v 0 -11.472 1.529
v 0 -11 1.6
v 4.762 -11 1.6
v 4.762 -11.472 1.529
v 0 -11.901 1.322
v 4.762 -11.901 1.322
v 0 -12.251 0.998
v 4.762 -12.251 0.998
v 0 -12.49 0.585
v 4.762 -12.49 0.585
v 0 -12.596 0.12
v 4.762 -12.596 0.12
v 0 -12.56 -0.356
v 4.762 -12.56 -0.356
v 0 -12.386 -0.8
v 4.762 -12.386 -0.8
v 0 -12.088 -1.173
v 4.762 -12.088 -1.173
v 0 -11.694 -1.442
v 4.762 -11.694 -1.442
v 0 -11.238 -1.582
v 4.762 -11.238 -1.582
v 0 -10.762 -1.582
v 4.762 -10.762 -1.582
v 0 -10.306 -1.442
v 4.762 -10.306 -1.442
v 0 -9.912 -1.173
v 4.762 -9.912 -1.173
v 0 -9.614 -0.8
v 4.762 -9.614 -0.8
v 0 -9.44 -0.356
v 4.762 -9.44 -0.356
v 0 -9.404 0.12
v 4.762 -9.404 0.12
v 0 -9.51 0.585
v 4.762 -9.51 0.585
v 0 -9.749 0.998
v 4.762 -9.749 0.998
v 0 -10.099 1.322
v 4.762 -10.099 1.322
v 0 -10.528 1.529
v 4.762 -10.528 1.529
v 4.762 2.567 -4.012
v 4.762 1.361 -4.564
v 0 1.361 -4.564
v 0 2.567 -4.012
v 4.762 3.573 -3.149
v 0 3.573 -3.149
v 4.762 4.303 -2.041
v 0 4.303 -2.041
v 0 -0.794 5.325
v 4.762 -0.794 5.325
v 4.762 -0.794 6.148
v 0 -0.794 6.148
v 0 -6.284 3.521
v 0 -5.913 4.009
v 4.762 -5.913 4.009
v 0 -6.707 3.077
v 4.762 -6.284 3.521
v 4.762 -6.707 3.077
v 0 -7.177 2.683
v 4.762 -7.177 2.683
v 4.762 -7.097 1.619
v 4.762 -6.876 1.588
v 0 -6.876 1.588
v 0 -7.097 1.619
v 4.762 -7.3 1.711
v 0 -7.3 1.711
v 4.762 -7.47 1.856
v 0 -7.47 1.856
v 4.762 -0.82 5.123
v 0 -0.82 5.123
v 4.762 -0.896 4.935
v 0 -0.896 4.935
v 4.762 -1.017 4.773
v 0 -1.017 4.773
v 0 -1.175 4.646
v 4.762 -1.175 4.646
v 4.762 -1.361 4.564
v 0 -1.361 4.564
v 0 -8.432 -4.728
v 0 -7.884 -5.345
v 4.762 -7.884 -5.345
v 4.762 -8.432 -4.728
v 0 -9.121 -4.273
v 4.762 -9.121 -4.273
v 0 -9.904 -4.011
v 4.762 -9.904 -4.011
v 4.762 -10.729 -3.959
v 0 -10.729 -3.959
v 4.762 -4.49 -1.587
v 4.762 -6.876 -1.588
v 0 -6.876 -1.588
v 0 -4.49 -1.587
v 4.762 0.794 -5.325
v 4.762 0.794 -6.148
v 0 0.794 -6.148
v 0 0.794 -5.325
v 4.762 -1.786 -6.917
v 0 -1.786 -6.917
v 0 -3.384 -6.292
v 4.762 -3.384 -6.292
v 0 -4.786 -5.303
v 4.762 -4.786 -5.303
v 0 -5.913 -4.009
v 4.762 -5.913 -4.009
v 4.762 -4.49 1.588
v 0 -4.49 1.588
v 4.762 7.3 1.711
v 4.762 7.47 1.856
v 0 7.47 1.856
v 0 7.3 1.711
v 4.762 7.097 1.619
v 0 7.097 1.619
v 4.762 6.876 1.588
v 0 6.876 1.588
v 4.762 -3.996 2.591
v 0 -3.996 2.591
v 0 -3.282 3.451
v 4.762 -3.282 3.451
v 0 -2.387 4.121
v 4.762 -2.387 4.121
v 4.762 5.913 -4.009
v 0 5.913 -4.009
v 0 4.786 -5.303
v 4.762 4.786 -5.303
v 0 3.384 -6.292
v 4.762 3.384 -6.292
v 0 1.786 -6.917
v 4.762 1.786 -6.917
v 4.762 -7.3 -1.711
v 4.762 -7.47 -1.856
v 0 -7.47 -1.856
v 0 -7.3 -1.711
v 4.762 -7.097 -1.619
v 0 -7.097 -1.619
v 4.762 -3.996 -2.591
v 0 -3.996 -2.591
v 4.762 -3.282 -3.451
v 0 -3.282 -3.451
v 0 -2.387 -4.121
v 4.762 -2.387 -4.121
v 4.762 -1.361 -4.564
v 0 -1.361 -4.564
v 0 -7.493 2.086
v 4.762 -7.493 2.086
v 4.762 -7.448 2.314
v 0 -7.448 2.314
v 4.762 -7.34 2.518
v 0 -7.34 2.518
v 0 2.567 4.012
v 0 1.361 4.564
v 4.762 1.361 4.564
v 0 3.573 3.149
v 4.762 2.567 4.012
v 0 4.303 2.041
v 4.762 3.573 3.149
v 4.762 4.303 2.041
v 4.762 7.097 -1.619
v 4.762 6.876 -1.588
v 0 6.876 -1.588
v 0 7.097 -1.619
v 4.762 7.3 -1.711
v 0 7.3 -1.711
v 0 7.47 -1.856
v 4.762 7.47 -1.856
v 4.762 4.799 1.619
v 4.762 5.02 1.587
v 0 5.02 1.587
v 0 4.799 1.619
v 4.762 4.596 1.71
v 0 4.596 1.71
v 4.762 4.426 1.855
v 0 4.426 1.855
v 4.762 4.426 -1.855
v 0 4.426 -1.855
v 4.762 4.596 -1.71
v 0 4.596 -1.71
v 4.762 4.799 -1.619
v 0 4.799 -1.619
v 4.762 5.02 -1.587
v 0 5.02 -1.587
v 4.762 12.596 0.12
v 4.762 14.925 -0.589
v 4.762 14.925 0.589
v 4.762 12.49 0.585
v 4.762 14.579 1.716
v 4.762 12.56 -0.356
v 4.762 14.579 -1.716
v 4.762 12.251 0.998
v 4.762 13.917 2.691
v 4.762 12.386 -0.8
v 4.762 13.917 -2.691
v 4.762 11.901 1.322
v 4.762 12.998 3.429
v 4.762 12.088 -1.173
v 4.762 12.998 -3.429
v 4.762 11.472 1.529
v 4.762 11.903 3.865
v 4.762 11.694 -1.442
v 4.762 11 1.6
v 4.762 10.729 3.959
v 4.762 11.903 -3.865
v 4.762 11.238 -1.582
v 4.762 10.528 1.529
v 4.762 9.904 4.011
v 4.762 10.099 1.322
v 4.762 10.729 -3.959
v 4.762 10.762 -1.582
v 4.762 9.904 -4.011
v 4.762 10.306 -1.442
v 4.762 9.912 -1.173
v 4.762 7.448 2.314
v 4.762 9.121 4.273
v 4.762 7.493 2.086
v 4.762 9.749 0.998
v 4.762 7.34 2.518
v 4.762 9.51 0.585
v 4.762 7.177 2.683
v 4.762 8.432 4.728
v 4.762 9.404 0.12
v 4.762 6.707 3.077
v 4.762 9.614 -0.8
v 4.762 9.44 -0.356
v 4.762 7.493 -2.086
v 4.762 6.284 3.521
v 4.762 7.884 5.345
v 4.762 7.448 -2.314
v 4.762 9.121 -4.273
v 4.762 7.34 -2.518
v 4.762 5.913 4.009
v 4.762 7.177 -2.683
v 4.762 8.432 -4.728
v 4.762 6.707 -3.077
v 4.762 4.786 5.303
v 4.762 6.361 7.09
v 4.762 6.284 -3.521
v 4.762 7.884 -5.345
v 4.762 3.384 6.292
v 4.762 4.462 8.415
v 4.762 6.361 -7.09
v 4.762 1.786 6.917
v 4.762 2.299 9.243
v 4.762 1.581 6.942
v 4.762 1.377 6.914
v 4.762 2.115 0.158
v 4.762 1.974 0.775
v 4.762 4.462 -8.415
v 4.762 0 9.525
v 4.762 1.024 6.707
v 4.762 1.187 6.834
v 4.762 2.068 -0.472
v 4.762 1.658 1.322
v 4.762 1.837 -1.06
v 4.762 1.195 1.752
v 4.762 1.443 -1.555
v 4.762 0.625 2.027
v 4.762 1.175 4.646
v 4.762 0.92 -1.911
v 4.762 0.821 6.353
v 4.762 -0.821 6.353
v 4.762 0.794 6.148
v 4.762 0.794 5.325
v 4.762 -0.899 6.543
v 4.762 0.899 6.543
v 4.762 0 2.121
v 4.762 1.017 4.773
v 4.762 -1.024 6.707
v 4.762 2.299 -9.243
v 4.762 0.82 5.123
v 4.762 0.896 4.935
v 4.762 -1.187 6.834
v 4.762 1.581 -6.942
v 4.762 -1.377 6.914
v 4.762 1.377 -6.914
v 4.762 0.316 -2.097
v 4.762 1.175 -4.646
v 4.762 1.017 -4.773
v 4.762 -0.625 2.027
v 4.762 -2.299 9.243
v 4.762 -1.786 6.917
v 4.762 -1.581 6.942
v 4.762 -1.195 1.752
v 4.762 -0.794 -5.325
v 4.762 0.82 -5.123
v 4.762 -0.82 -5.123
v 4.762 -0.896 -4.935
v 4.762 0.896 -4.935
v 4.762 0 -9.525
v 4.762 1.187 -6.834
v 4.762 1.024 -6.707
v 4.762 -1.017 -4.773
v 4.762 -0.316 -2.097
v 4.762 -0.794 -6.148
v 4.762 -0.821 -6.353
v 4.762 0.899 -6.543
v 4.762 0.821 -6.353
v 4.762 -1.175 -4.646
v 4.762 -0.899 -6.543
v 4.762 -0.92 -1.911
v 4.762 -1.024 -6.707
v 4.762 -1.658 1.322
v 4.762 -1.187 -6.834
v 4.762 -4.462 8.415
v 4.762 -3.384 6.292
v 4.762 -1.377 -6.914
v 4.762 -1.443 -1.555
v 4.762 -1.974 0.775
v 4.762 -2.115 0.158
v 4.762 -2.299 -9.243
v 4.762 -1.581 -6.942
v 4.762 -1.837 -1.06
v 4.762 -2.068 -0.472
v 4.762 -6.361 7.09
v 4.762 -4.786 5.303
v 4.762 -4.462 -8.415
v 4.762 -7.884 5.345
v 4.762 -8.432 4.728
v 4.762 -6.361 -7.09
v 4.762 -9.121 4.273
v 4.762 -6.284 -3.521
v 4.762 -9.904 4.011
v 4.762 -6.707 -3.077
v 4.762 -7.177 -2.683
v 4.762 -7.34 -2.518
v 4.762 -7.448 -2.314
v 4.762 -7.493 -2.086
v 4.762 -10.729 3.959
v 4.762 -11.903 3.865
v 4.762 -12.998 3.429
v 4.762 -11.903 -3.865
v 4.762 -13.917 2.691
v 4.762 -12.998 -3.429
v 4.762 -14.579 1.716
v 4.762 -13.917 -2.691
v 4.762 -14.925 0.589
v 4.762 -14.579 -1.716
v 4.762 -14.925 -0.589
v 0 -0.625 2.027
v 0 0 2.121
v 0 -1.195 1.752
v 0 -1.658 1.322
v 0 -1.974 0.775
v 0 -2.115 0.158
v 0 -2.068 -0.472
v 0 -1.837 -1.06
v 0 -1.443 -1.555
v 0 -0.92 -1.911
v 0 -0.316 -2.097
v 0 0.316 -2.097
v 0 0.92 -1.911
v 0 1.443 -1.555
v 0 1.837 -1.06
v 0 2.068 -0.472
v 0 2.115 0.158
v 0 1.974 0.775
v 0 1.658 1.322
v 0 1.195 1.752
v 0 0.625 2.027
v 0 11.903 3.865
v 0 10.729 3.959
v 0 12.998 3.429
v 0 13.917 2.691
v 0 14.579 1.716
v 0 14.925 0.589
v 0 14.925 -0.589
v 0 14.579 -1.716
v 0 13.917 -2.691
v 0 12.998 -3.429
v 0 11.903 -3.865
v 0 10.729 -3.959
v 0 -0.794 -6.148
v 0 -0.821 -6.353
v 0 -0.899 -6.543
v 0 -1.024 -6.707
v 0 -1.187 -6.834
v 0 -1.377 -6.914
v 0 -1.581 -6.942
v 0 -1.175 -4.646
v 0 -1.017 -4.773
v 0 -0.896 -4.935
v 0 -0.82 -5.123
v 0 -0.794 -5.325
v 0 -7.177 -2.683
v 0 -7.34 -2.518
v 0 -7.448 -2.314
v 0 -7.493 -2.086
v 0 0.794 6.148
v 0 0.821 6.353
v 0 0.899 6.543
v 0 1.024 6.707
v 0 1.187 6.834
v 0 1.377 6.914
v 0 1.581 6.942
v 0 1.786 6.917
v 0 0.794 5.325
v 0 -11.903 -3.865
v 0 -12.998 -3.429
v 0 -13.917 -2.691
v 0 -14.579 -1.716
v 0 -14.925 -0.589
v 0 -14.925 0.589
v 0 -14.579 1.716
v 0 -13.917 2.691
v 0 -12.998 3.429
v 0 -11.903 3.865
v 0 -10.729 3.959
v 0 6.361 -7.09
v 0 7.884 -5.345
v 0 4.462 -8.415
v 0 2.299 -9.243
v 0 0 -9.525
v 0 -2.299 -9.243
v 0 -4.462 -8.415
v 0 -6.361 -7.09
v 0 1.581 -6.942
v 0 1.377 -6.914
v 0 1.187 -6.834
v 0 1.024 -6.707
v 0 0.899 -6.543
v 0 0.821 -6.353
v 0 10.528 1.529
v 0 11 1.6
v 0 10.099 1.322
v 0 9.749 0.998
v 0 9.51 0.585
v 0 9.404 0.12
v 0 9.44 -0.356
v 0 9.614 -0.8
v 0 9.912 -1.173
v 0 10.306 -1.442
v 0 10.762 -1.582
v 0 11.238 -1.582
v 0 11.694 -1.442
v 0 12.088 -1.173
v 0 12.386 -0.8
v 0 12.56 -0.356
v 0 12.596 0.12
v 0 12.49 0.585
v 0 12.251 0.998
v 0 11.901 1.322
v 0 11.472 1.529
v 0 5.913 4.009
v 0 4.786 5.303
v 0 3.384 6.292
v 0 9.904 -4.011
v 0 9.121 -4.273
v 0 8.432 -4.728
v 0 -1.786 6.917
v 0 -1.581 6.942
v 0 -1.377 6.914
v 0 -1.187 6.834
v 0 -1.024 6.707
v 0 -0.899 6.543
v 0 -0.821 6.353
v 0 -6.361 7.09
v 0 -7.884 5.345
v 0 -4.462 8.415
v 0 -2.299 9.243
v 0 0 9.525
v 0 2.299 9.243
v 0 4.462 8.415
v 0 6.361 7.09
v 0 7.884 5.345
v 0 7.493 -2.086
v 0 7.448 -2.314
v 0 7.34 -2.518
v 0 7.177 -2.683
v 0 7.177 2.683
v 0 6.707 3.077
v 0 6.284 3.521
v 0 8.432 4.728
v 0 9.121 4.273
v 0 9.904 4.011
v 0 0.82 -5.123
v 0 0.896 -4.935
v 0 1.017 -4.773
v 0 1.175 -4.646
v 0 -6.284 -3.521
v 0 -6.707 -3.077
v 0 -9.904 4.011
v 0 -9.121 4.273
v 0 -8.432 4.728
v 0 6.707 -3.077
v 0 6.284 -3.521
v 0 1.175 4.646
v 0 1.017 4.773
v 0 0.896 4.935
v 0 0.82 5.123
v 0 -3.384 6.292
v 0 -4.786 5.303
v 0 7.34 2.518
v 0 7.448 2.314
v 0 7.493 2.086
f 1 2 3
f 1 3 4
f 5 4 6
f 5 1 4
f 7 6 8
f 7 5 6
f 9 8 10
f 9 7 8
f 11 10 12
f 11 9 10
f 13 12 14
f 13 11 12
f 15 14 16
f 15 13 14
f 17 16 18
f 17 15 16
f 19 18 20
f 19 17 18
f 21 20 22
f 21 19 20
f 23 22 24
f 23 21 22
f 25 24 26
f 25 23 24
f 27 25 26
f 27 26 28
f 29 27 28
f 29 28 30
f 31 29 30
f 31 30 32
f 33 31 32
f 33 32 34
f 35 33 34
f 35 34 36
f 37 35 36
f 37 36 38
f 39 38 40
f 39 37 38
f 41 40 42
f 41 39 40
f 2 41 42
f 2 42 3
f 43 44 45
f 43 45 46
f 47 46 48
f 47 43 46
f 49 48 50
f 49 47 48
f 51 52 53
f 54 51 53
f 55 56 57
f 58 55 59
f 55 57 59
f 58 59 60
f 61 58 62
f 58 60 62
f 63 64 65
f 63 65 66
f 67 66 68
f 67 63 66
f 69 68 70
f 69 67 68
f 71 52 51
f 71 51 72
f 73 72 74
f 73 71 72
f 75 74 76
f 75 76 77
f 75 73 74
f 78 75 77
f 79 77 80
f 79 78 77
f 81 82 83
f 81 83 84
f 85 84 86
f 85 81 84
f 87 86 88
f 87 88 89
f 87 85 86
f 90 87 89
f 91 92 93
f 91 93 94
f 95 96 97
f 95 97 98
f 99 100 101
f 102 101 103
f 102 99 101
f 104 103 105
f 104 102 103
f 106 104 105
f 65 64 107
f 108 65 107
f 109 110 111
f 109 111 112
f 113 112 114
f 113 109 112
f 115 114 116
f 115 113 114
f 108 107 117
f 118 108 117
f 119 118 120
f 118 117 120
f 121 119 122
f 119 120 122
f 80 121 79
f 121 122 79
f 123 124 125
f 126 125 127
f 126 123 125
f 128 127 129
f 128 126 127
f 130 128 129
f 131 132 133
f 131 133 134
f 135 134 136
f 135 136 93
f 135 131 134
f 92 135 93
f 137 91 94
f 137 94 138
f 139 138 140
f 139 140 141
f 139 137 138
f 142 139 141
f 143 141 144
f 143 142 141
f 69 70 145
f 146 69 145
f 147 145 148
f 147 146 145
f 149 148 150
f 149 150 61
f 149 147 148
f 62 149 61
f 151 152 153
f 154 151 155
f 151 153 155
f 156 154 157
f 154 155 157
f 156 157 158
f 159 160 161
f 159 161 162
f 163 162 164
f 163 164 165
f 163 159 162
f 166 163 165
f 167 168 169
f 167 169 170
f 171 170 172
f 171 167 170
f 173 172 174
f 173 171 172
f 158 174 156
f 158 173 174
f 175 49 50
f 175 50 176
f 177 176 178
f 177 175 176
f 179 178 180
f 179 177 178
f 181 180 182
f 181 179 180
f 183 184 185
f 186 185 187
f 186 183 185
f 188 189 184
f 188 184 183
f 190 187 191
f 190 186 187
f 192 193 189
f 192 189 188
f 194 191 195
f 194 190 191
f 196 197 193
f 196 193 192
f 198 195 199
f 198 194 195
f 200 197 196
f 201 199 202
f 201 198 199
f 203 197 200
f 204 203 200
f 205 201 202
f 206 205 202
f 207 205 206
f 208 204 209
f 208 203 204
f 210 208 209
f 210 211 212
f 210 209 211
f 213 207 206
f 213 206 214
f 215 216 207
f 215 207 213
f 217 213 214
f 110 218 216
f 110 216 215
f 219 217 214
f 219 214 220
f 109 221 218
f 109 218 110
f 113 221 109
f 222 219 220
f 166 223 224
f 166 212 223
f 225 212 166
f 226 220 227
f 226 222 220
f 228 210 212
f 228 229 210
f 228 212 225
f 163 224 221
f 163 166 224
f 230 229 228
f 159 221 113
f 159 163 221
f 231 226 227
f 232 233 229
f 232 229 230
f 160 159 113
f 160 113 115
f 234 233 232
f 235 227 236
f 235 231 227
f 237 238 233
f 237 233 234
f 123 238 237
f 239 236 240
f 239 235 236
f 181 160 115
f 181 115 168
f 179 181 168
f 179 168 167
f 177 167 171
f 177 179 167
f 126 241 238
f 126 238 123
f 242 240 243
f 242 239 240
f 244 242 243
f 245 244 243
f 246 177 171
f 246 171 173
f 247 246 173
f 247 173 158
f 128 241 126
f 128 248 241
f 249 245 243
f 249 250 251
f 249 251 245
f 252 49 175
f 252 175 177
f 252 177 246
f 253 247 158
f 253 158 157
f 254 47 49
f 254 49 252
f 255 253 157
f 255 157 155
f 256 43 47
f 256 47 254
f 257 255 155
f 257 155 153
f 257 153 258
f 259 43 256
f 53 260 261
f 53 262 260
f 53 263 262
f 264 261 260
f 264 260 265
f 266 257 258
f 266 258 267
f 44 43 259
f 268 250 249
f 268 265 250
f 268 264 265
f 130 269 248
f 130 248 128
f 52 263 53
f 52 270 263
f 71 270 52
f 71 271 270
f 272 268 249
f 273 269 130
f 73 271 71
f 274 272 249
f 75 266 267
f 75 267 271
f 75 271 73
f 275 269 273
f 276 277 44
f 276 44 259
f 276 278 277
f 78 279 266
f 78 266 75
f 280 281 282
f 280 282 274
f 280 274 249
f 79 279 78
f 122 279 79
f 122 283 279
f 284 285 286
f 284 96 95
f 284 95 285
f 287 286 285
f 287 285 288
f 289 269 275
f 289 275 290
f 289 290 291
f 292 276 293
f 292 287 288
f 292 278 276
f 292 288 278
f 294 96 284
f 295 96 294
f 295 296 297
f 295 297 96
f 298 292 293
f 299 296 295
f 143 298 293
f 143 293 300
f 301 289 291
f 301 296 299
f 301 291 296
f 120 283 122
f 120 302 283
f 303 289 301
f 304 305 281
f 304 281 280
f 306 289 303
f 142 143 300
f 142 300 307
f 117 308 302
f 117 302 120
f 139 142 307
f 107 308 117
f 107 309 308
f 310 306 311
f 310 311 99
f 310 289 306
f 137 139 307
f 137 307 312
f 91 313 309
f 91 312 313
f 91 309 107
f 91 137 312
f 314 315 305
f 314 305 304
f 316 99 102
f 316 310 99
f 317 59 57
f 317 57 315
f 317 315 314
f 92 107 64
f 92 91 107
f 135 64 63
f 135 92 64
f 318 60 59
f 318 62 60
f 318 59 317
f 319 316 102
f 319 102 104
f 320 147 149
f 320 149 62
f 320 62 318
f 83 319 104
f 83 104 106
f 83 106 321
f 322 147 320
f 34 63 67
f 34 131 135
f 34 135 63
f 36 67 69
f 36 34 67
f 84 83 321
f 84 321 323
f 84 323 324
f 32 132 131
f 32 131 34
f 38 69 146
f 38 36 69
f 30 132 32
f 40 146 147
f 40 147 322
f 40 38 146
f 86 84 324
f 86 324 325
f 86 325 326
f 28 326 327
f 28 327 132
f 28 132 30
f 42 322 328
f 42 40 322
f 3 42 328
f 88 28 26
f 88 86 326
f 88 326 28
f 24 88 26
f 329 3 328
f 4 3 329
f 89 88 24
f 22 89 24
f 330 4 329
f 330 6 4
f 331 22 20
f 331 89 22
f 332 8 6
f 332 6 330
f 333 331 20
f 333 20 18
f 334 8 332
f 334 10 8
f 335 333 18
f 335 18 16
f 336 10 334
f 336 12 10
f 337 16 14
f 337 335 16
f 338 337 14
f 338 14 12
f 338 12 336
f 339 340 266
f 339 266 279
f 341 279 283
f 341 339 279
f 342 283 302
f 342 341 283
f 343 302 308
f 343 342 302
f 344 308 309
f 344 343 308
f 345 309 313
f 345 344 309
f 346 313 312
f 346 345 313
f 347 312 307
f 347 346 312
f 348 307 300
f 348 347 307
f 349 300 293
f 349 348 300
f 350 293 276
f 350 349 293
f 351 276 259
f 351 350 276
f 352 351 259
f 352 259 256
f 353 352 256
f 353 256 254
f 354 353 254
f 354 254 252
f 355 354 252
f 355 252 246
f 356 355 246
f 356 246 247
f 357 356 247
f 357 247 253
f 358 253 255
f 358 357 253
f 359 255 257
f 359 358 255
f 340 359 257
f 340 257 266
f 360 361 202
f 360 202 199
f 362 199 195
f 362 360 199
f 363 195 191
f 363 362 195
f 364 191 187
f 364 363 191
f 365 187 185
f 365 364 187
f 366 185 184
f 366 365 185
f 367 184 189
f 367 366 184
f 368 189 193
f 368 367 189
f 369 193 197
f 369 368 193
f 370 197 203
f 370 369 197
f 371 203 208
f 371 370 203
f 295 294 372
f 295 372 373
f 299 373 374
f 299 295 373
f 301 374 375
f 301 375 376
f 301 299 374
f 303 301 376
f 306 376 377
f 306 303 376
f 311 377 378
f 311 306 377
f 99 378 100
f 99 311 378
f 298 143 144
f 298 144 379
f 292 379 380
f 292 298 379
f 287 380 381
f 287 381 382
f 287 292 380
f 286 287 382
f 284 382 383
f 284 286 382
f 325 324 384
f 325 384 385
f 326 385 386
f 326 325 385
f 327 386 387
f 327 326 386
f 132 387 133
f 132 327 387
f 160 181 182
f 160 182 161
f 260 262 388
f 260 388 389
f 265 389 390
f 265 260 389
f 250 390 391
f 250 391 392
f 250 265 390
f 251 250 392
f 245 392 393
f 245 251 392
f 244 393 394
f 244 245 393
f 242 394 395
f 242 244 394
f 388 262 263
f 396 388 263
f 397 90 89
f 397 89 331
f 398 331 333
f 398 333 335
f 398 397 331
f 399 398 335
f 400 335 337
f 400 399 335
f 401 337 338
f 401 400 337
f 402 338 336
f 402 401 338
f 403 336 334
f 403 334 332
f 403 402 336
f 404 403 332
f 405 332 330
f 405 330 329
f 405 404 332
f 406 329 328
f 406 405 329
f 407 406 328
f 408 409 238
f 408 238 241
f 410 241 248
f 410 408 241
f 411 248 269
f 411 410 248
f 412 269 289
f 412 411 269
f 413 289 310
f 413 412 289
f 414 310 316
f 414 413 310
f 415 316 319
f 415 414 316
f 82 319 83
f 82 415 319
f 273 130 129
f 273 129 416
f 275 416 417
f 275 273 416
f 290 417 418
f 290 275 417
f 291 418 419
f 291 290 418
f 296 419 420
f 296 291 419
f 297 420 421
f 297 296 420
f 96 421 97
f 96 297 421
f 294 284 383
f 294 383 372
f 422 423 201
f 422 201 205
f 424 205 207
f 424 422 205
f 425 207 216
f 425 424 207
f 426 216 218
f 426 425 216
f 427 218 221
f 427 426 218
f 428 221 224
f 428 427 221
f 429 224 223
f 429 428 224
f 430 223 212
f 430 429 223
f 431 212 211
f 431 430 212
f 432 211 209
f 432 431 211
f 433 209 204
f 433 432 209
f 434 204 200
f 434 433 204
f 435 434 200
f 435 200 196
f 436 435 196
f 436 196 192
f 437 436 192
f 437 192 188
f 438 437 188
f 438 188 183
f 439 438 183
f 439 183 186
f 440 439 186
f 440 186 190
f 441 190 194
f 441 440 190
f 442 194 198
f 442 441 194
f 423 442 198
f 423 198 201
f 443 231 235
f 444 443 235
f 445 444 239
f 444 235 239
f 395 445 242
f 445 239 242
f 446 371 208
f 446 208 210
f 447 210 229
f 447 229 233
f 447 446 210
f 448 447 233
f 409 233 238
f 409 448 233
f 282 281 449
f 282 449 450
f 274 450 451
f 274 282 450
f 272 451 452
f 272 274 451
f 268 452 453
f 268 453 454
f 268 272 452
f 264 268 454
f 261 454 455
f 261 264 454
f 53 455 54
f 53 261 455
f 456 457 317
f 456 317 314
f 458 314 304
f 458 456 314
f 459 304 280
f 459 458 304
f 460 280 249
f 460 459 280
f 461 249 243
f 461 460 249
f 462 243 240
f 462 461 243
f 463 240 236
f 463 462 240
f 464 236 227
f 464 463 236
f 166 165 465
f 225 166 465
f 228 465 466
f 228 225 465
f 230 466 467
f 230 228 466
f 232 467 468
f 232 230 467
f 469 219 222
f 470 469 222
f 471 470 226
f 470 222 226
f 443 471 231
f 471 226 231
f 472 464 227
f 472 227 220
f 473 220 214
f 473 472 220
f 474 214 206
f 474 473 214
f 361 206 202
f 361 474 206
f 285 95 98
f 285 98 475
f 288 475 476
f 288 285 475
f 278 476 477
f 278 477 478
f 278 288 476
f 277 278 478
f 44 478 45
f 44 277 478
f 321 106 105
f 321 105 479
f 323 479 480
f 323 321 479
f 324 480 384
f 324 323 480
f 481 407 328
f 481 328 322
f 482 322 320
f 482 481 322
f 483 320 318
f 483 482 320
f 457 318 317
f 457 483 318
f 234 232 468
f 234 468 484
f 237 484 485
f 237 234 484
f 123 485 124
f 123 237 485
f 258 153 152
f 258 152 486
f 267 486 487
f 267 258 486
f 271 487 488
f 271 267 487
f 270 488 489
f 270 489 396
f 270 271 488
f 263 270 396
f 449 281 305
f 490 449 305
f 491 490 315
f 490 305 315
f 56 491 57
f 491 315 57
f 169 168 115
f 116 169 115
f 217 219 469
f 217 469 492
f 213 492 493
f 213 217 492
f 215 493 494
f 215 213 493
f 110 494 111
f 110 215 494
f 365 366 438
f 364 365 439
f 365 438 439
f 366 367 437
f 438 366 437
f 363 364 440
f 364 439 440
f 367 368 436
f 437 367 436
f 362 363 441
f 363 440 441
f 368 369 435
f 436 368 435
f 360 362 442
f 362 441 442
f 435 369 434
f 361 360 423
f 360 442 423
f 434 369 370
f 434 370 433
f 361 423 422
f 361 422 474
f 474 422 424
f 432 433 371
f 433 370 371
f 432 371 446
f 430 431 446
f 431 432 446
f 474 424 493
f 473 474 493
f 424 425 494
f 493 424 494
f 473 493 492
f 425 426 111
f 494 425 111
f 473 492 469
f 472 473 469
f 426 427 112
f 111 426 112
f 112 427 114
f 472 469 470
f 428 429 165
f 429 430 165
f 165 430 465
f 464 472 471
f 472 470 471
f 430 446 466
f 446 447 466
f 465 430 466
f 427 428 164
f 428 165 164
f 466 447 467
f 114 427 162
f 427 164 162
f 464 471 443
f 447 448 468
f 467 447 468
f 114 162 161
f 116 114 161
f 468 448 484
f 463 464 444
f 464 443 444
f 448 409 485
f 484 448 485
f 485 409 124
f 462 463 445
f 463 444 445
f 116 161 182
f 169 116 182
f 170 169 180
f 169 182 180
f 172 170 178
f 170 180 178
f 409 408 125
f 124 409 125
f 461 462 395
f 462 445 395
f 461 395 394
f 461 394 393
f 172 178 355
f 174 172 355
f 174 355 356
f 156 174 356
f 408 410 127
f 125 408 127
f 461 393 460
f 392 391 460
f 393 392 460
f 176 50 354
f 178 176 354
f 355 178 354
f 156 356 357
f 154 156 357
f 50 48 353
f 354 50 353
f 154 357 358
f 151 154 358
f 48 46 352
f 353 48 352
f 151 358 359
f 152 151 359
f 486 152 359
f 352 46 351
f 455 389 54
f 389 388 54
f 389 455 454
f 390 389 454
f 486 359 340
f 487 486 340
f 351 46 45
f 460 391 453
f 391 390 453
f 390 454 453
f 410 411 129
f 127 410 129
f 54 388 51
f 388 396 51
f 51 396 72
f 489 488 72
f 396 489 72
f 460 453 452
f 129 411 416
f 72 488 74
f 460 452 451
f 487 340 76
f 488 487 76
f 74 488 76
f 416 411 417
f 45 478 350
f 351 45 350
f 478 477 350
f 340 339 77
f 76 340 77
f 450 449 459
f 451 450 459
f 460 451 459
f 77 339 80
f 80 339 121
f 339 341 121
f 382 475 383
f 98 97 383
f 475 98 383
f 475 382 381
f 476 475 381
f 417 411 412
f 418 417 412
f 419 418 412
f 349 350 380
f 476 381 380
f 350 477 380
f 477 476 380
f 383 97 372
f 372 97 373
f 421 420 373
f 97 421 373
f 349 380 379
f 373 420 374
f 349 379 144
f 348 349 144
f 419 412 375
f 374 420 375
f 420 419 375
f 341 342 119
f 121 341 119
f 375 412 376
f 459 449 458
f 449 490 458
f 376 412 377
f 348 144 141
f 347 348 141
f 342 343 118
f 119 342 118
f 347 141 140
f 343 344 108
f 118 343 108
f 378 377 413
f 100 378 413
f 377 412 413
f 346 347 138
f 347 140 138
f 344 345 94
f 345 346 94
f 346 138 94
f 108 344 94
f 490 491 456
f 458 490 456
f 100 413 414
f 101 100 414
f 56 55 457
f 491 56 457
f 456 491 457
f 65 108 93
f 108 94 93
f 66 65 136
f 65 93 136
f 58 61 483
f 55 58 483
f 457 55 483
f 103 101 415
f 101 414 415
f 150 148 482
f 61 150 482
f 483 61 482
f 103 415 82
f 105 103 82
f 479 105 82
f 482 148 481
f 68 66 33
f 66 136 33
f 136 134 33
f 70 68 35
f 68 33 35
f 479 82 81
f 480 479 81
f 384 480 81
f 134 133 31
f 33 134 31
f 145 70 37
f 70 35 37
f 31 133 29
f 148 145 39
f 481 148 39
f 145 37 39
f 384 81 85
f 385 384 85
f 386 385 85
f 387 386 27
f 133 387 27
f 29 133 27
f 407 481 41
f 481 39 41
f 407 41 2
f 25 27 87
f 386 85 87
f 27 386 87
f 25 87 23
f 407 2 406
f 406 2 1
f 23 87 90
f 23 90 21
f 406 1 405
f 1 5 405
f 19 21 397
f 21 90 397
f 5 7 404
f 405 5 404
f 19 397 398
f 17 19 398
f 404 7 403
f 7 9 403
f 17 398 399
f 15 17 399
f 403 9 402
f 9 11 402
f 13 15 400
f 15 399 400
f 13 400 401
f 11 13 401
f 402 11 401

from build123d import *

# Parameters (mm, degrees)
SKETCH1_R           = 2.1209000000000002
SKETCH1_R_2         = 1.6002
BOSS_EXTRUDE1_DEPTH = 4.7625
CUT_EXTRUDE1_DEPTH  = 19.370370377662503
FILLET1_R           = 0.79375


with BuildPart() as part:
    # Sketch1 → Boss-Extrude1 (new body)
    with BuildSketch(Plane(origin=(0, 0, 0), x_dir=(0, 0, -1), z_dir=(1, 0, 0))):
        with BuildLine():
            ThreePointArc((-3.9594667824617957, 10.7287079782197), (2.8e-15, 14.96875), (3.9594667824617935, 10.728707978219694))
            ThreePointArc((3.9594667824617935, 10.728707978219694), (4.272672724168048, 9.121274682724051), (5.345280156323423, 7.883755770596593))
            ThreePointArc((5.345280156323423, 7.883755770596593), (9.525, 1.06e-15), (5.345280156323425, -7.883755770596589))
            ThreePointArc((5.345280156323425, -7.883755770596589), (4.272672724168048, -9.12127468272405), (3.9594667824617975, -10.728707978219694))
            ThreePointArc((3.9594667824617975, -10.728707978219694), (2.8e-15, -14.968749999999996), (-3.9594667824617917, -10.7287079782197))
            ThreePointArc((-3.9594667824617917, -10.7287079782197), (-4.272672724168042, -9.121274682724055), (-5.345280156323421, -7.883755770596593))
            ThreePointArc((-5.345280156323421, -7.883755770596593), (-9.524999999999999, -3.06e-15), (-5.345280156323423, 7.883755770596589))
            ThreePointArc((-5.345280156323423, 7.883755770596589), (-4.272672724168045, 9.121274682724053), (-3.9594667824617957, 10.7287079782197))
        make_face()
        with Locations(Location((0, 0, 0), (0, 0, 180))):
            Circle(SKETCH1_R, mode=Mode.SUBTRACT)
        with Locations(Location((0, 11, 0), (0, 0, 180))):
            Circle(SKETCH1_R_2, mode=Mode.SUBTRACT)
        with Locations(Location((0, -11, 0), (0, 0, 180))):
            Circle(SKETCH1_R_2, mode=Mode.SUBTRACT)
    extrude(amount=BOSS_EXTRUDE1_DEPTH)

    # Sketch2 → Cut-Extrude1 (cut, through all)
    with BuildSketch(Plane(origin=(4.7625, 0, 0), x_dir=(0, 0, -1), z_dir=(1, 0, 0))):
        with BuildLine():
            Line((-1.5875000000000001, -7.362580542128799), (-1.5874999999999997, -4.490128060534577))
            ThreePointArc((-1.5874999999999997, -4.490128060534577), (-3.6450027313013944, -3.0651853677722936), (-4.69588832783532, -0.7937500000000003))
            Line((-4.69588832783532, -0.7937500000000003), (-7.09951582856183, -0.7937500000000006))
            ThreePointArc((-7.09951582856183, -0.7937500000000006), (-6.115616956356625, -3.692207104920213), (-4.008960117242562, -5.912816827947443))
            ThreePointArc((-4.008960117242562, -5.912816827947443), (-3.046958974664247, -6.740089655613493), (-2.2977150650912916, -7.764033059168784))
            ThreePointArc((-2.2977150650912916, -7.764033059168784), (-1.9529503466198308, -7.545009188704331), (-1.5875000000000001, -7.362580542128799))
        make_face()
        with BuildLine():
            Line((1.5875000000000001, -7.362580542128799), (1.5874999999999997, -4.490128060534577))
            ThreePointArc((1.5874999999999997, -4.490128060534577), (3.645002731301394, -3.0651853677722944), (4.695888327835319, -0.7937500000000003))
            Line((4.695888327835319, -0.7937500000000003), (7.099515828561831, -0.7937500000000003))
            ThreePointArc((7.099515828561831, -0.7937500000000003), (6.115616956356629, -3.692207104920211), (4.008960117242569, -5.912816827947442))
            ThreePointArc((4.008960117242569, -5.912816827947442), (3.0469589746642507, -6.74008965561349), (2.2977150650912943, -7.764033059168785))
            ThreePointArc((2.2977150650912943, -7.764033059168785), (1.9529503466198321, -7.545009188704331), (1.5875000000000001, -7.362580542128799))
        make_face()
        with BuildLine():
            Line((-7.09951582856183, 0.7937500000000006), (-4.69588832783532, 0.7937500000000003))
            ThreePointArc((-4.69588832783532, 0.7937500000000003), (-3.6450027313013944, 3.0651853677722936), (-1.5874999999999997, 4.490128060534576))
            Line((-1.5874999999999997, 4.490128060534576), (-1.5875000000000004, 7.362580542128802))
            ThreePointArc((-1.5875000000000004, 7.362580542128802), (-1.9529503466198312, 7.545009188704334), (-2.297715065091291, 7.764033059168786))
            ThreePointArc((-2.297715065091291, 7.764033059168786), (-3.046958974664248, 6.74008965561349), (-4.008960117242567, 5.912816827947441))
            ThreePointArc((-4.008960117242567, 5.912816827947441), (-6.115616956356626, 3.692207104920211), (-7.09951582856183, 0.7937500000000006))
        make_face()
        with BuildLine():
            Line((1.5874999999999997, 4.490128060534576), (1.5875000000000004, 7.362580542128802))
            ThreePointArc((1.5875000000000004, 7.362580542128802), (1.9529503466198308, 7.545009188704333), (2.2977150650912908, 7.764033059168786))
            ThreePointArc((2.2977150650912908, 7.764033059168786), (3.04695897466425, 6.740089655613488), (4.0089601172425695, 5.912816827947439))
            ThreePointArc((4.0089601172425695, 5.912816827947439), (6.115616956356628, 3.6922071049202088), (7.09951582856183, 0.7937500000000001))
            Line((7.09951582856183, 0.7937500000000001), (4.695888327835319, 0.7937500000000003))
            ThreePointArc((4.695888327835319, 0.7937500000000003), (3.645002731301393, 3.0651853677722936), (1.5874999999999997, 4.490128060534576))
        make_face()
    extrude(amount=-CUT_EXTRUDE1_DEPTH, mode=Mode.SUBTRACT)

    # Fillet1
    # the kernel refuses this fillet: 0.79375 mm, written as the material it adds along each edge
    with BuildSketch(Plane(origin=(4.7625, -0.79375, -4.69588832783532), x_dir=(0, -0.9739846340944042, 0.2266140607905643), z_dir=(-1, 0, 0))) as fillet1_piece_1:
        with BuildLine():
            CenterArc((0.6306170426342453, -0.7922663309145631), FILLET1_R, 93.50374068607991, 73.39845040097973)
            Line((-0.14248326067818778, -0.612391420162052), (0, 0))
            ThreePointArc((0, 0), (0.2910540196773445, -0.00890201451262073), (0.5821080393546879, 2e-17))
        make_face()
    extrude(amount=4.7625)
    with BuildSketch(Plane(origin=(4.7625, -0.7937500000000003, -7.099515828561831), x_dir=(0, -1.2e-16, 1), z_dir=(-1, 0, 0))) as fillet1_piece_2:
        with BuildLine():
            CenterArc((0.9511547664575569, -0.79375), FILLET1_R, 90.00000000000001, 104.47751218592987)
            ThreePointArc((0.1826096336945221, -0.9921874999999994), (0.07376813927591291, -0.499321331749944), (0, 0))
            Line((0, 0), (0.9511547664575568, 0))
        make_face()
    extrude(amount=4.7625)
    with BuildSketch(Plane(origin=(4.7625, 0.7937500000000004, -7.099515828561831), x_dir=(0, 0.9834817412823682, 0.18100736052492677), z_dir=(-1, 0, 0))) as fillet1_piece_3:
        with BuildLine():
            CenterArc((0.9528046458700647, -0.7917687535280427), FILLET1_R, 85.95092901125643, 104.47751218592998)
            Line((0.17216601372718518, -0.9354433459447041), (0, 0))
            ThreePointArc((0, 0), (0.5044259889900348, 0.01783121824761195), (1.0088519779800686, 3e-17))
        make_face()
    extrude(amount=4.7625)
    with BuildSketch(Plane(origin=(4.7625, 0.7937500000000004, -4.69588832783532), x_dir=(0, -3.5e-16, -1), z_dir=(-1, 0, 0))) as fillet1_piece_4:
        with BuildLine():
            CenterArc((0.6287485435860521, -0.79375), FILLET1_R, 89.99999999999997, 73.39845040097973)
            ThreePointArc((-0.13191386661700052, -0.5669642857142849), (-0.05728650796072109, -0.2854994645150646), (0, 0))
            Line((0, 0), (0.6287485435860525, 0))
        make_face()
    extrude(amount=4.7625)
    with BuildSketch(Plane(origin=(4.7625, 4.490128060534577, -1.5875), x_dir=(0, -0.3814588594181724, -0.9243858169462505), z_dir=(-1, 0, 0))) as fillet1_piece_5:
        with BuildLine():
            CenterArc((0.531562729123544, -0.792696105792815), FILLET1_R, 92.95285644533071, 64.62306647484768)
            Line((-0.2021685130775424, -0.48991313612964066), (0, 0))
            ThreePointArc((0, 0), (0.24533664421086704, -0.00632336524311312), (0.4906732884217341, -2e-17))
        make_face()
    extrude(amount=4.7625)
    with BuildSketch(Plane(origin=(4.7625, 7.764033059168785, -2.2977150650912908), x_dir=(0, -0.5063837713427546, 0.8623082257062661), z_dir=(-1, 0, 0))) as fillet1_piece_6:
        with BuildLine():
            CenterArc((0.7539344065414385, -0.7907853062648578), FILLET1_R, 94.95360014564893, 78.58484225728135)
            ThreePointArc((-0.03477336431713144, -0.7014594159121466), (-0.00629236326442682, -0.35127968530901016), (0, 0))
            ThreePointArc((0, 0), (0.3426974575188369, -0.01482346867571009), (0.685394915037674, 1e-17))
        make_face()
    extrude(amount=4.7625)
    with BuildSketch(Plane(origin=(4.7625, 7.362580542128802, -1.5875000000000004), x_dir=(0, 0.4507075585568903, -0.892671662292294), z_dir=(-1, 0, 0))) as fillet1_piece_7:
        with BuildLine():
            CenterArc((0.4890515947139495, 0.7925039046242565), FILLET1_R, 206.78908923910086, 60.00000000000017)
            Line((-0.21950653723055963, 0.43475478001972634), (0, 0))
            ThreePointArc((0, 0), (0.22229617941543137, 0.00623047687871969), (0.44459235883086456, 0))
        make_face()
    extrude(amount=4.7625)
    with BuildSketch(Plane(origin=(4.7625, 4.490128060534576, 1.5875), x_dir=(0, 1, -4.2e-16), z_dir=(-1, 0, 0))) as fillet1_piece_8:
        with BuildLine():
            CenterArc((0.5299877249827253, -0.79375), FILLET1_R, 89.99999999999997, 64.62306647484775)
            ThreePointArc((-0.1871716729483179, -0.4535714285714287), (-0.08774060732805387, -0.22919781797903635), (0, 0))
            Line((0, 0), (0.5299877249827256, 0))
        make_face()
    extrude(amount=4.7625)
    with BuildSketch(Plane(origin=(4.7625, 7.362580542128802, 1.5875000000000004), x_dir=(0, 0.4507075585568887, 0.8926716622922948), z_dir=(-1, 0, 0))) as fillet1_piece_9:
        with BuildLine():
            CenterArc((0.4890515947139505, -0.7925039046242564), FILLET1_R, 93.21091076089908, 60.000000000000085)
            Line((-0.21950653723055885, -0.43475478001972667), (0, 0))
            ThreePointArc((0, 0), (0.22229617941543217, -0.0062304768787197), (0.4445923588308641, 3e-17))
        make_face()
    extrude(amount=4.7625)
    with BuildSketch(Plane(origin=(4.7625, 7.764033059168787, 2.2977150650912916), x_dir=(0, -0.8361785115671588, 0.5484573791948931), z_dir=(-1, 0, 0))) as fillet1_piece_10:
        with BuildLine():
            CenterArc((0.7524865660320088, -0.79216315106995), FILLET1_R, 93.62356396435027, 78.58484225726829)
            ThreePointArc((-0.03393532877352373, -0.6845542951589412), (-0.0021623763281384, -0.3430110883660692), (0, 0))
            ThreePointArc((0, 0), (0.3511603974816025, -0.01110794251034867), (0.7023207949632068, 0))
        make_face()
    extrude(amount=4.7625)
    with BuildSketch(Plane(origin=(4.7625, 0.7937500000000004, 4.69588832783532), x_dir=(0, 0.9739846340944044, -0.22661406079056337), z_dir=(-1, 0, 0))) as fillet1_piece_11:
        with BuildLine():
            CenterArc((0.6306170426342449, -0.7922663309145632), FILLET1_R, 93.50374068607998, 73.39845040097971)
            Line((-0.14248326067818828, -0.6123914201620527), (0, 0))
            ThreePointArc((0, 0), (0.29105401967734285, -0.00890201451262188), (0.5821080393546864, -1e-17))
        make_face()
    extrude(amount=4.7625)
    with BuildSketch(Plane(origin=(4.7625, -0.79375, 4.69588832783532), x_dir=(0, -7.1e-16, 1), z_dir=(-1, 0, 0))) as fillet1_piece_12:
        with BuildLine():
            CenterArc((0.6287485435860539, -0.79375), FILLET1_R, 90.00000000000004, 73.39845040097977)
            ThreePointArc((-0.13191386661699994, -0.5669642857142864), (-0.05728650796072168, -0.28549946451506575), (0, 0))
            Line((0, 0), (0.6287485435860534, 0))
        make_face()
    extrude(amount=4.7625)
    with BuildSketch(Plane(origin=(4.7625, 0.7937500000000007, 7.099515828561831), x_dir=(0, -3.5e-16, -1), z_dir=(-1, 0, 0))) as fillet1_piece_13:
        with BuildLine():
            CenterArc((0.9511547664575583, -0.79375), FILLET1_R, 89.99999999999997, 104.47751218592998)
            ThreePointArc((0.1826096336945243, -0.9921875000000004), (0.07376813927591445, -0.4993213317499442), (0, 0))
            Line((0, 0), (0.9511547664575586, 0))
        make_face()
    extrude(amount=4.7625)
    with BuildSketch(Plane(origin=(4.7625, -0.7937500000000006, 7.099515828561831), x_dir=(0, -0.9834817412823684, -0.18100736052492664), z_dir=(-1, 0, 0))) as fillet1_piece_14:
        with BuildLine():
            CenterArc((0.9528046458700652, -0.7917687535280429), FILLET1_R, 85.9509290112564, 104.47751218593004)
            Line((0.17216601372718549, -0.9354433459447042), (0, 0))
            ThreePointArc((0, 0), (0.5044259889900345, 0.01783121824761361), (1.0088519779800695, -1e-17))
        make_face()
    extrude(amount=4.7625)
    with BuildSketch(Plane(origin=(4.7625, -7.764033059168784, 2.2977150650912916), x_dir=(0, 0.5063837713427585, -0.862308225706264), z_dir=(-1, 0, 0))) as fillet1_piece_15:
        with BuildLine():
            CenterArc((0.7539344065414401, -0.7907853062648579), FILLET1_R, 94.95360014564929, 78.58484225728117)
            ThreePointArc((-0.03477336431713059, -0.7014594159121491), (-0.00629236326442512, -0.35127968530901216), (0, 0))
            ThreePointArc((0, 0), (0.34269745751883435, -0.01482346867571016), (0.6853949150376707, 0))
        make_face()
    extrude(amount=4.7625)
    with BuildSketch(Plane(origin=(4.7625, -7.362580542128798, 1.5875000000000004), x_dir=(0, -0.4507075585568874, 0.8926716622922954), z_dir=(-1, 0, 0))) as fillet1_piece_16:
        with BuildLine():
            CenterArc((0.48905159471395165, 0.7925039046242556), FILLET1_R, 206.78908923910083, 59.99999999999994)
            Line((-0.2195065372305578, 0.43475478001972623), (0, 0))
            ThreePointArc((0, 0), (0.22229617941543278, 0.00623047687871768), (0.4445923588308635, 1e-17))
        make_face()
    extrude(amount=4.7625)
    with BuildSketch(Plane(origin=(4.7625, -7.362580542128799, -1.5875000000000004), x_dir=(0, -0.4507075585568885, -0.8926716622922948), z_dir=(-1, 0, 0))) as fillet1_piece_17:
        with BuildLine():
            CenterArc((0.4890515947139506, -0.7925039046242561), FILLET1_R, 93.21091076089908, 60.00000000000003)
            Line((-0.21950653723055835, -0.4347547800197259), (0, 0))
            ThreePointArc((0, 0), (0.22229617941543273, -0.00623047687871996), (0.4445923588308643, 1e-17))
        make_face()
    extrude(amount=4.7625)
    with BuildSketch(Plane(origin=(4.7625, -7.764033059168785, -2.297715065091294), x_dir=(0, 0.8361785115671573, -0.5484573791948956), z_dir=(-1, 0, 0))) as fillet1_piece_18:
        with BuildLine():
            CenterArc((0.7524865660320036, -0.7921631510699503), FILLET1_R, 93.62356396435017, 78.58484225726816)
            ThreePointArc((-0.03393532877352819, -0.6845542951589385), (-0.00216237632813965, -0.343011088366068), (0, 0))
            ThreePointArc((0, 0), (0.35116039748160127, -0.01110794251034834), (0.7023207949632029, 3e-17))
        make_face()
    extrude(amount=4.7625)


solid = part.part
